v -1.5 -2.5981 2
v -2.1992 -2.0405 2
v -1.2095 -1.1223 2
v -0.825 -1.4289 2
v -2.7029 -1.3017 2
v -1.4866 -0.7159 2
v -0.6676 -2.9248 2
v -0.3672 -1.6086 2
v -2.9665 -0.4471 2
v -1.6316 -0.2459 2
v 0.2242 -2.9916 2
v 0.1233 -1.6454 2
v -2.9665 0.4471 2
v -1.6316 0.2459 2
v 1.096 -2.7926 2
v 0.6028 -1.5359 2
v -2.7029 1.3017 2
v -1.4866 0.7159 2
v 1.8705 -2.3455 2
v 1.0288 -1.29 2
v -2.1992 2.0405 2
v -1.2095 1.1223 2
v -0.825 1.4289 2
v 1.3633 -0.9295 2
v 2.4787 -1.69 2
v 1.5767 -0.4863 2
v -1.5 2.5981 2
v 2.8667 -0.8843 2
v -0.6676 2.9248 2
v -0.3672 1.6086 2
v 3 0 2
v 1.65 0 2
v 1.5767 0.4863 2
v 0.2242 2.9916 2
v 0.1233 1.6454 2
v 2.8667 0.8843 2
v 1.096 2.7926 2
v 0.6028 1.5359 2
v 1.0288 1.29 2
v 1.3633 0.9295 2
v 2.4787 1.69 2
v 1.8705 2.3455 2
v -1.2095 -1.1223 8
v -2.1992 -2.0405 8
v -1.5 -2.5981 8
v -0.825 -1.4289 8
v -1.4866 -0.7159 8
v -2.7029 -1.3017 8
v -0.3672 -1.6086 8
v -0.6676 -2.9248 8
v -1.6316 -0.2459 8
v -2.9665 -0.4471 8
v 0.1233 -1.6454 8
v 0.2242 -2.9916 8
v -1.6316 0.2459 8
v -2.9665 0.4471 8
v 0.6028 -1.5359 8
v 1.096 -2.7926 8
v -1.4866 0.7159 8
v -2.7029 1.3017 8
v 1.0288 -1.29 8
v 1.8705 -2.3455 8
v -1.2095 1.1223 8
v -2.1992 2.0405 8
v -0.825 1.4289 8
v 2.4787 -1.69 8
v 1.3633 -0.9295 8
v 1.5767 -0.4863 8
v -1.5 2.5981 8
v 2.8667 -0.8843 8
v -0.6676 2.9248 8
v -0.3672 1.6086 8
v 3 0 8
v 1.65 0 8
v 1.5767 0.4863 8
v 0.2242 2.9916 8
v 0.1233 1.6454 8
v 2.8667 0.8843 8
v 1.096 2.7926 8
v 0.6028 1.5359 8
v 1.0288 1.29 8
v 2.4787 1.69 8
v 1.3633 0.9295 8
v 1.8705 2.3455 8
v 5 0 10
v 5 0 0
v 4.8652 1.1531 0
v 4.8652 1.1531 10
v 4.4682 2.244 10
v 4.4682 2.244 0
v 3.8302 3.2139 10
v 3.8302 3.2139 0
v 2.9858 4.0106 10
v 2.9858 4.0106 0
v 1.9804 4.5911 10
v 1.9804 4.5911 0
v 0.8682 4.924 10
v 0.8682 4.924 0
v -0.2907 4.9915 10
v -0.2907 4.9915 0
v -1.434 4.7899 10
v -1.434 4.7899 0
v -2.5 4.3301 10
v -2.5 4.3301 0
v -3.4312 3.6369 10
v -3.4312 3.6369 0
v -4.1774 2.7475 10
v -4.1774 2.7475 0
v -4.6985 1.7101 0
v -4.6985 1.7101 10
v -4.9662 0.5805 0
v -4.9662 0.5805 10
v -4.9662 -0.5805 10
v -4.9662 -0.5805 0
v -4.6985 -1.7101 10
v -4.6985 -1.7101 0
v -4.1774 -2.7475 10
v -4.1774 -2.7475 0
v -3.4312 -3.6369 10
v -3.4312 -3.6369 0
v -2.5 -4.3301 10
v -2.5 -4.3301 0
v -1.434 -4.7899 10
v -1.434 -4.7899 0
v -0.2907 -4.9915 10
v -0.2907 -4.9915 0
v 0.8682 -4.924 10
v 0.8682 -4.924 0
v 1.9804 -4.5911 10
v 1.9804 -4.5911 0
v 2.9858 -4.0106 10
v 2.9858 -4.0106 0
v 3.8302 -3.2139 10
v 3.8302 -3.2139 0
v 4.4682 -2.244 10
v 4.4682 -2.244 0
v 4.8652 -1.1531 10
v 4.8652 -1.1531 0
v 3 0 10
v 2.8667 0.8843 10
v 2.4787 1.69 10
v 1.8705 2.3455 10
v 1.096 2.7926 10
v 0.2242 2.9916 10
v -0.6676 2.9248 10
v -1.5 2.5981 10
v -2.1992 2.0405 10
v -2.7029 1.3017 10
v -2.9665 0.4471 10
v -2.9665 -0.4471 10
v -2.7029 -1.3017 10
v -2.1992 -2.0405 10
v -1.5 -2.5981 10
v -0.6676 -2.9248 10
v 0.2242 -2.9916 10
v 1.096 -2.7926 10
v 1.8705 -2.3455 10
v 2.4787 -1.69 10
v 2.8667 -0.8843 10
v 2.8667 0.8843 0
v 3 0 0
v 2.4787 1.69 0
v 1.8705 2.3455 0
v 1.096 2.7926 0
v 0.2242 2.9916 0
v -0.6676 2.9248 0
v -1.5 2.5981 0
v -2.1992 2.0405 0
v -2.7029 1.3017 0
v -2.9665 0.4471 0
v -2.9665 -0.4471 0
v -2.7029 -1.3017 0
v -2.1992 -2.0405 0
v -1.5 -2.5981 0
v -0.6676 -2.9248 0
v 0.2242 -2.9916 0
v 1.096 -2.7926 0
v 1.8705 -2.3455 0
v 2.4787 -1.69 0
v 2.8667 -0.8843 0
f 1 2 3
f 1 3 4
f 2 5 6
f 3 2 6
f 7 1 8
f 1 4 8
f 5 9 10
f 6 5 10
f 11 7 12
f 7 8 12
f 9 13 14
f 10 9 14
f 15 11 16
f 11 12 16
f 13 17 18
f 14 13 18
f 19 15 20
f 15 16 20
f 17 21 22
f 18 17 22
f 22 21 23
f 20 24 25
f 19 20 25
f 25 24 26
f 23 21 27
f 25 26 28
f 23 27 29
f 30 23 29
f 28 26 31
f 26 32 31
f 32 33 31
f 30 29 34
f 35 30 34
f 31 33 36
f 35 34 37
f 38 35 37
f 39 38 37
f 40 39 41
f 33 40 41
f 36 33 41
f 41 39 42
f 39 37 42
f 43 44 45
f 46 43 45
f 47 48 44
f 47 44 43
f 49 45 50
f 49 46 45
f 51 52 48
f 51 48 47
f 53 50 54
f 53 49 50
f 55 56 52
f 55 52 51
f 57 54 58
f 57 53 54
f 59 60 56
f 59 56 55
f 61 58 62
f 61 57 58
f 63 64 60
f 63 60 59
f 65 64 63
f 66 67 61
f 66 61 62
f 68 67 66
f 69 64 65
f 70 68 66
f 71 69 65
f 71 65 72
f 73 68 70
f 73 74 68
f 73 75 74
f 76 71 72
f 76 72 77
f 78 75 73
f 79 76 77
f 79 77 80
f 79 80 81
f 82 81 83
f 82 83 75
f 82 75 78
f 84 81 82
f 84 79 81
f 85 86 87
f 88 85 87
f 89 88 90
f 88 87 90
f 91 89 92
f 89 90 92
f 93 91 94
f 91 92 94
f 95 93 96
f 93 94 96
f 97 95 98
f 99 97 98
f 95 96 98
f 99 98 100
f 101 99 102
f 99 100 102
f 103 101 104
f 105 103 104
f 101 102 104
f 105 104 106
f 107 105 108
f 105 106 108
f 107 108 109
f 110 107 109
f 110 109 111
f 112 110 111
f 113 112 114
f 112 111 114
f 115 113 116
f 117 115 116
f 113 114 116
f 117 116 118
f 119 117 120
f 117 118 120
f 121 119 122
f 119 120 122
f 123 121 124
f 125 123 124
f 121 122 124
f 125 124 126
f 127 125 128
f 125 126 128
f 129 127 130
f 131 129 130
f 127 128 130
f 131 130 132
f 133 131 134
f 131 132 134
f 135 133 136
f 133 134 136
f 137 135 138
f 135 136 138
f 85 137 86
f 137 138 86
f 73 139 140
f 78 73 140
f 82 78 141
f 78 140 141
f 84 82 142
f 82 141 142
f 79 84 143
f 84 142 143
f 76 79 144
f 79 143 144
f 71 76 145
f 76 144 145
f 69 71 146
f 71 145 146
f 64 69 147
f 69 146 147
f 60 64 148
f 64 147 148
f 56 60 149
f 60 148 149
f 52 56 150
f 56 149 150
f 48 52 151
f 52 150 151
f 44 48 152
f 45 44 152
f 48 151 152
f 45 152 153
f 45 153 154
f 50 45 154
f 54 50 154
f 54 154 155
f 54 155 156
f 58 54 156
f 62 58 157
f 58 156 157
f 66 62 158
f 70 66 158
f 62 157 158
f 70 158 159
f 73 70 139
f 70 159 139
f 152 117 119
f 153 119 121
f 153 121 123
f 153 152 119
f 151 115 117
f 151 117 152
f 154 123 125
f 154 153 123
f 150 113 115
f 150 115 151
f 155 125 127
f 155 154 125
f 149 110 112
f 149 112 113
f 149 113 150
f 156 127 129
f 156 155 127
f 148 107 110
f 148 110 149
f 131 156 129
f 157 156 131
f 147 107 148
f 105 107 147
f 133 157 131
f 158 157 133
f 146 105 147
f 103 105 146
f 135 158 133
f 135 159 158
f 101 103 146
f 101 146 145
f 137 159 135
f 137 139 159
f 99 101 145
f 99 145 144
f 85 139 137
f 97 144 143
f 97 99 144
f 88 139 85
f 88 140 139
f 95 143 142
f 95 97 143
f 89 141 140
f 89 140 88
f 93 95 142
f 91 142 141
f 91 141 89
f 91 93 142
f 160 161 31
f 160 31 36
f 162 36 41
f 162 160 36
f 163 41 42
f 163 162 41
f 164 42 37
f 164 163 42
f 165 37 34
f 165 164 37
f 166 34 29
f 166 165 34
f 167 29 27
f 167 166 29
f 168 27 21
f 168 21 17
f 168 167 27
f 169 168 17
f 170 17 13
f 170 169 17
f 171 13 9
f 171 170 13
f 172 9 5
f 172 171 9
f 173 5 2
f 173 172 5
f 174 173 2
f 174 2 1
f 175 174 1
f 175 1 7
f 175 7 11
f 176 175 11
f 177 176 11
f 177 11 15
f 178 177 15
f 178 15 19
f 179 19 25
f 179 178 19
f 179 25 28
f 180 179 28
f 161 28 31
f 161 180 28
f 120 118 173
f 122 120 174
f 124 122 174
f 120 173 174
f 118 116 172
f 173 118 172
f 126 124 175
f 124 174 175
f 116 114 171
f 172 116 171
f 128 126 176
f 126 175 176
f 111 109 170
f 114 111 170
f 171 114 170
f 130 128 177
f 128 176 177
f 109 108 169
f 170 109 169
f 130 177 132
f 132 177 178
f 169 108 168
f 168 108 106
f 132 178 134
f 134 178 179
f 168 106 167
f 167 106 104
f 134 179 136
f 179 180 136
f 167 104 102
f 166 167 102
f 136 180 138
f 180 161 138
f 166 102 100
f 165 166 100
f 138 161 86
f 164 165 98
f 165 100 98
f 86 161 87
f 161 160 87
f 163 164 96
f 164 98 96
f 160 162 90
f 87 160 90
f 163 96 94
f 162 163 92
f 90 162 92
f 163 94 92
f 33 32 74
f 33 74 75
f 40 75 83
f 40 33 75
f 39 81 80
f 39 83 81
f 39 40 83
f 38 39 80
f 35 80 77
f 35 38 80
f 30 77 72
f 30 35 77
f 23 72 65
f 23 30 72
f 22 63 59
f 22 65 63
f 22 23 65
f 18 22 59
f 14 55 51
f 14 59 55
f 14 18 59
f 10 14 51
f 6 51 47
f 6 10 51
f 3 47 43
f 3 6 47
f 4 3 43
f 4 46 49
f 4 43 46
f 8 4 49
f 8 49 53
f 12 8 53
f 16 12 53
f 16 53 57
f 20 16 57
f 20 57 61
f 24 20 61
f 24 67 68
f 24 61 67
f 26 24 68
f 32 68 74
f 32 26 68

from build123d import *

# Parameters (mm, degrees)
SKETCH1_R           = 5
BOSS_EXTRUDE1_DEPTH = 10
SKETCH2_R           = 3
CUT_EXTRUDE1_DEPTH  = 2
SKETCH3_R           = 1.65
CUT_EXTRUDE2_DEPTH  = 14
SKETCH4_R           = 3
CUT_EXTRUDE3_DEPTH  = 2


with BuildPart() as part:
    # Sketch1 → Boss-Extrude1 (new body)
    with BuildSketch(Plane.XY):
        Circle(SKETCH1_R)
    extrude(amount=BOSS_EXTRUDE1_DEPTH)

    # Sketch2 → Cut-Extrude1 (cut)
    with BuildSketch(Plane.XY):
        Circle(SKETCH2_R)
    extrude(amount=CUT_EXTRUDE1_DEPTH, mode=Mode.SUBTRACT)

    # Sketch3 → Cut-Extrude2 (cut)
    with BuildSketch(Plane.XY):
        Circle(SKETCH3_R)
    extrude(amount=CUT_EXTRUDE2_DEPTH, mode=Mode.SUBTRACT)

    # Sketch4 → Cut-Extrude3 (cut)
    with BuildSketch(Plane.XY.offset(10)):
        Circle(SKETCH4_R)
    extrude(amount=-CUT_EXTRUDE3_DEPTH, mode=Mode.SUBTRACT)


solid = part.part
